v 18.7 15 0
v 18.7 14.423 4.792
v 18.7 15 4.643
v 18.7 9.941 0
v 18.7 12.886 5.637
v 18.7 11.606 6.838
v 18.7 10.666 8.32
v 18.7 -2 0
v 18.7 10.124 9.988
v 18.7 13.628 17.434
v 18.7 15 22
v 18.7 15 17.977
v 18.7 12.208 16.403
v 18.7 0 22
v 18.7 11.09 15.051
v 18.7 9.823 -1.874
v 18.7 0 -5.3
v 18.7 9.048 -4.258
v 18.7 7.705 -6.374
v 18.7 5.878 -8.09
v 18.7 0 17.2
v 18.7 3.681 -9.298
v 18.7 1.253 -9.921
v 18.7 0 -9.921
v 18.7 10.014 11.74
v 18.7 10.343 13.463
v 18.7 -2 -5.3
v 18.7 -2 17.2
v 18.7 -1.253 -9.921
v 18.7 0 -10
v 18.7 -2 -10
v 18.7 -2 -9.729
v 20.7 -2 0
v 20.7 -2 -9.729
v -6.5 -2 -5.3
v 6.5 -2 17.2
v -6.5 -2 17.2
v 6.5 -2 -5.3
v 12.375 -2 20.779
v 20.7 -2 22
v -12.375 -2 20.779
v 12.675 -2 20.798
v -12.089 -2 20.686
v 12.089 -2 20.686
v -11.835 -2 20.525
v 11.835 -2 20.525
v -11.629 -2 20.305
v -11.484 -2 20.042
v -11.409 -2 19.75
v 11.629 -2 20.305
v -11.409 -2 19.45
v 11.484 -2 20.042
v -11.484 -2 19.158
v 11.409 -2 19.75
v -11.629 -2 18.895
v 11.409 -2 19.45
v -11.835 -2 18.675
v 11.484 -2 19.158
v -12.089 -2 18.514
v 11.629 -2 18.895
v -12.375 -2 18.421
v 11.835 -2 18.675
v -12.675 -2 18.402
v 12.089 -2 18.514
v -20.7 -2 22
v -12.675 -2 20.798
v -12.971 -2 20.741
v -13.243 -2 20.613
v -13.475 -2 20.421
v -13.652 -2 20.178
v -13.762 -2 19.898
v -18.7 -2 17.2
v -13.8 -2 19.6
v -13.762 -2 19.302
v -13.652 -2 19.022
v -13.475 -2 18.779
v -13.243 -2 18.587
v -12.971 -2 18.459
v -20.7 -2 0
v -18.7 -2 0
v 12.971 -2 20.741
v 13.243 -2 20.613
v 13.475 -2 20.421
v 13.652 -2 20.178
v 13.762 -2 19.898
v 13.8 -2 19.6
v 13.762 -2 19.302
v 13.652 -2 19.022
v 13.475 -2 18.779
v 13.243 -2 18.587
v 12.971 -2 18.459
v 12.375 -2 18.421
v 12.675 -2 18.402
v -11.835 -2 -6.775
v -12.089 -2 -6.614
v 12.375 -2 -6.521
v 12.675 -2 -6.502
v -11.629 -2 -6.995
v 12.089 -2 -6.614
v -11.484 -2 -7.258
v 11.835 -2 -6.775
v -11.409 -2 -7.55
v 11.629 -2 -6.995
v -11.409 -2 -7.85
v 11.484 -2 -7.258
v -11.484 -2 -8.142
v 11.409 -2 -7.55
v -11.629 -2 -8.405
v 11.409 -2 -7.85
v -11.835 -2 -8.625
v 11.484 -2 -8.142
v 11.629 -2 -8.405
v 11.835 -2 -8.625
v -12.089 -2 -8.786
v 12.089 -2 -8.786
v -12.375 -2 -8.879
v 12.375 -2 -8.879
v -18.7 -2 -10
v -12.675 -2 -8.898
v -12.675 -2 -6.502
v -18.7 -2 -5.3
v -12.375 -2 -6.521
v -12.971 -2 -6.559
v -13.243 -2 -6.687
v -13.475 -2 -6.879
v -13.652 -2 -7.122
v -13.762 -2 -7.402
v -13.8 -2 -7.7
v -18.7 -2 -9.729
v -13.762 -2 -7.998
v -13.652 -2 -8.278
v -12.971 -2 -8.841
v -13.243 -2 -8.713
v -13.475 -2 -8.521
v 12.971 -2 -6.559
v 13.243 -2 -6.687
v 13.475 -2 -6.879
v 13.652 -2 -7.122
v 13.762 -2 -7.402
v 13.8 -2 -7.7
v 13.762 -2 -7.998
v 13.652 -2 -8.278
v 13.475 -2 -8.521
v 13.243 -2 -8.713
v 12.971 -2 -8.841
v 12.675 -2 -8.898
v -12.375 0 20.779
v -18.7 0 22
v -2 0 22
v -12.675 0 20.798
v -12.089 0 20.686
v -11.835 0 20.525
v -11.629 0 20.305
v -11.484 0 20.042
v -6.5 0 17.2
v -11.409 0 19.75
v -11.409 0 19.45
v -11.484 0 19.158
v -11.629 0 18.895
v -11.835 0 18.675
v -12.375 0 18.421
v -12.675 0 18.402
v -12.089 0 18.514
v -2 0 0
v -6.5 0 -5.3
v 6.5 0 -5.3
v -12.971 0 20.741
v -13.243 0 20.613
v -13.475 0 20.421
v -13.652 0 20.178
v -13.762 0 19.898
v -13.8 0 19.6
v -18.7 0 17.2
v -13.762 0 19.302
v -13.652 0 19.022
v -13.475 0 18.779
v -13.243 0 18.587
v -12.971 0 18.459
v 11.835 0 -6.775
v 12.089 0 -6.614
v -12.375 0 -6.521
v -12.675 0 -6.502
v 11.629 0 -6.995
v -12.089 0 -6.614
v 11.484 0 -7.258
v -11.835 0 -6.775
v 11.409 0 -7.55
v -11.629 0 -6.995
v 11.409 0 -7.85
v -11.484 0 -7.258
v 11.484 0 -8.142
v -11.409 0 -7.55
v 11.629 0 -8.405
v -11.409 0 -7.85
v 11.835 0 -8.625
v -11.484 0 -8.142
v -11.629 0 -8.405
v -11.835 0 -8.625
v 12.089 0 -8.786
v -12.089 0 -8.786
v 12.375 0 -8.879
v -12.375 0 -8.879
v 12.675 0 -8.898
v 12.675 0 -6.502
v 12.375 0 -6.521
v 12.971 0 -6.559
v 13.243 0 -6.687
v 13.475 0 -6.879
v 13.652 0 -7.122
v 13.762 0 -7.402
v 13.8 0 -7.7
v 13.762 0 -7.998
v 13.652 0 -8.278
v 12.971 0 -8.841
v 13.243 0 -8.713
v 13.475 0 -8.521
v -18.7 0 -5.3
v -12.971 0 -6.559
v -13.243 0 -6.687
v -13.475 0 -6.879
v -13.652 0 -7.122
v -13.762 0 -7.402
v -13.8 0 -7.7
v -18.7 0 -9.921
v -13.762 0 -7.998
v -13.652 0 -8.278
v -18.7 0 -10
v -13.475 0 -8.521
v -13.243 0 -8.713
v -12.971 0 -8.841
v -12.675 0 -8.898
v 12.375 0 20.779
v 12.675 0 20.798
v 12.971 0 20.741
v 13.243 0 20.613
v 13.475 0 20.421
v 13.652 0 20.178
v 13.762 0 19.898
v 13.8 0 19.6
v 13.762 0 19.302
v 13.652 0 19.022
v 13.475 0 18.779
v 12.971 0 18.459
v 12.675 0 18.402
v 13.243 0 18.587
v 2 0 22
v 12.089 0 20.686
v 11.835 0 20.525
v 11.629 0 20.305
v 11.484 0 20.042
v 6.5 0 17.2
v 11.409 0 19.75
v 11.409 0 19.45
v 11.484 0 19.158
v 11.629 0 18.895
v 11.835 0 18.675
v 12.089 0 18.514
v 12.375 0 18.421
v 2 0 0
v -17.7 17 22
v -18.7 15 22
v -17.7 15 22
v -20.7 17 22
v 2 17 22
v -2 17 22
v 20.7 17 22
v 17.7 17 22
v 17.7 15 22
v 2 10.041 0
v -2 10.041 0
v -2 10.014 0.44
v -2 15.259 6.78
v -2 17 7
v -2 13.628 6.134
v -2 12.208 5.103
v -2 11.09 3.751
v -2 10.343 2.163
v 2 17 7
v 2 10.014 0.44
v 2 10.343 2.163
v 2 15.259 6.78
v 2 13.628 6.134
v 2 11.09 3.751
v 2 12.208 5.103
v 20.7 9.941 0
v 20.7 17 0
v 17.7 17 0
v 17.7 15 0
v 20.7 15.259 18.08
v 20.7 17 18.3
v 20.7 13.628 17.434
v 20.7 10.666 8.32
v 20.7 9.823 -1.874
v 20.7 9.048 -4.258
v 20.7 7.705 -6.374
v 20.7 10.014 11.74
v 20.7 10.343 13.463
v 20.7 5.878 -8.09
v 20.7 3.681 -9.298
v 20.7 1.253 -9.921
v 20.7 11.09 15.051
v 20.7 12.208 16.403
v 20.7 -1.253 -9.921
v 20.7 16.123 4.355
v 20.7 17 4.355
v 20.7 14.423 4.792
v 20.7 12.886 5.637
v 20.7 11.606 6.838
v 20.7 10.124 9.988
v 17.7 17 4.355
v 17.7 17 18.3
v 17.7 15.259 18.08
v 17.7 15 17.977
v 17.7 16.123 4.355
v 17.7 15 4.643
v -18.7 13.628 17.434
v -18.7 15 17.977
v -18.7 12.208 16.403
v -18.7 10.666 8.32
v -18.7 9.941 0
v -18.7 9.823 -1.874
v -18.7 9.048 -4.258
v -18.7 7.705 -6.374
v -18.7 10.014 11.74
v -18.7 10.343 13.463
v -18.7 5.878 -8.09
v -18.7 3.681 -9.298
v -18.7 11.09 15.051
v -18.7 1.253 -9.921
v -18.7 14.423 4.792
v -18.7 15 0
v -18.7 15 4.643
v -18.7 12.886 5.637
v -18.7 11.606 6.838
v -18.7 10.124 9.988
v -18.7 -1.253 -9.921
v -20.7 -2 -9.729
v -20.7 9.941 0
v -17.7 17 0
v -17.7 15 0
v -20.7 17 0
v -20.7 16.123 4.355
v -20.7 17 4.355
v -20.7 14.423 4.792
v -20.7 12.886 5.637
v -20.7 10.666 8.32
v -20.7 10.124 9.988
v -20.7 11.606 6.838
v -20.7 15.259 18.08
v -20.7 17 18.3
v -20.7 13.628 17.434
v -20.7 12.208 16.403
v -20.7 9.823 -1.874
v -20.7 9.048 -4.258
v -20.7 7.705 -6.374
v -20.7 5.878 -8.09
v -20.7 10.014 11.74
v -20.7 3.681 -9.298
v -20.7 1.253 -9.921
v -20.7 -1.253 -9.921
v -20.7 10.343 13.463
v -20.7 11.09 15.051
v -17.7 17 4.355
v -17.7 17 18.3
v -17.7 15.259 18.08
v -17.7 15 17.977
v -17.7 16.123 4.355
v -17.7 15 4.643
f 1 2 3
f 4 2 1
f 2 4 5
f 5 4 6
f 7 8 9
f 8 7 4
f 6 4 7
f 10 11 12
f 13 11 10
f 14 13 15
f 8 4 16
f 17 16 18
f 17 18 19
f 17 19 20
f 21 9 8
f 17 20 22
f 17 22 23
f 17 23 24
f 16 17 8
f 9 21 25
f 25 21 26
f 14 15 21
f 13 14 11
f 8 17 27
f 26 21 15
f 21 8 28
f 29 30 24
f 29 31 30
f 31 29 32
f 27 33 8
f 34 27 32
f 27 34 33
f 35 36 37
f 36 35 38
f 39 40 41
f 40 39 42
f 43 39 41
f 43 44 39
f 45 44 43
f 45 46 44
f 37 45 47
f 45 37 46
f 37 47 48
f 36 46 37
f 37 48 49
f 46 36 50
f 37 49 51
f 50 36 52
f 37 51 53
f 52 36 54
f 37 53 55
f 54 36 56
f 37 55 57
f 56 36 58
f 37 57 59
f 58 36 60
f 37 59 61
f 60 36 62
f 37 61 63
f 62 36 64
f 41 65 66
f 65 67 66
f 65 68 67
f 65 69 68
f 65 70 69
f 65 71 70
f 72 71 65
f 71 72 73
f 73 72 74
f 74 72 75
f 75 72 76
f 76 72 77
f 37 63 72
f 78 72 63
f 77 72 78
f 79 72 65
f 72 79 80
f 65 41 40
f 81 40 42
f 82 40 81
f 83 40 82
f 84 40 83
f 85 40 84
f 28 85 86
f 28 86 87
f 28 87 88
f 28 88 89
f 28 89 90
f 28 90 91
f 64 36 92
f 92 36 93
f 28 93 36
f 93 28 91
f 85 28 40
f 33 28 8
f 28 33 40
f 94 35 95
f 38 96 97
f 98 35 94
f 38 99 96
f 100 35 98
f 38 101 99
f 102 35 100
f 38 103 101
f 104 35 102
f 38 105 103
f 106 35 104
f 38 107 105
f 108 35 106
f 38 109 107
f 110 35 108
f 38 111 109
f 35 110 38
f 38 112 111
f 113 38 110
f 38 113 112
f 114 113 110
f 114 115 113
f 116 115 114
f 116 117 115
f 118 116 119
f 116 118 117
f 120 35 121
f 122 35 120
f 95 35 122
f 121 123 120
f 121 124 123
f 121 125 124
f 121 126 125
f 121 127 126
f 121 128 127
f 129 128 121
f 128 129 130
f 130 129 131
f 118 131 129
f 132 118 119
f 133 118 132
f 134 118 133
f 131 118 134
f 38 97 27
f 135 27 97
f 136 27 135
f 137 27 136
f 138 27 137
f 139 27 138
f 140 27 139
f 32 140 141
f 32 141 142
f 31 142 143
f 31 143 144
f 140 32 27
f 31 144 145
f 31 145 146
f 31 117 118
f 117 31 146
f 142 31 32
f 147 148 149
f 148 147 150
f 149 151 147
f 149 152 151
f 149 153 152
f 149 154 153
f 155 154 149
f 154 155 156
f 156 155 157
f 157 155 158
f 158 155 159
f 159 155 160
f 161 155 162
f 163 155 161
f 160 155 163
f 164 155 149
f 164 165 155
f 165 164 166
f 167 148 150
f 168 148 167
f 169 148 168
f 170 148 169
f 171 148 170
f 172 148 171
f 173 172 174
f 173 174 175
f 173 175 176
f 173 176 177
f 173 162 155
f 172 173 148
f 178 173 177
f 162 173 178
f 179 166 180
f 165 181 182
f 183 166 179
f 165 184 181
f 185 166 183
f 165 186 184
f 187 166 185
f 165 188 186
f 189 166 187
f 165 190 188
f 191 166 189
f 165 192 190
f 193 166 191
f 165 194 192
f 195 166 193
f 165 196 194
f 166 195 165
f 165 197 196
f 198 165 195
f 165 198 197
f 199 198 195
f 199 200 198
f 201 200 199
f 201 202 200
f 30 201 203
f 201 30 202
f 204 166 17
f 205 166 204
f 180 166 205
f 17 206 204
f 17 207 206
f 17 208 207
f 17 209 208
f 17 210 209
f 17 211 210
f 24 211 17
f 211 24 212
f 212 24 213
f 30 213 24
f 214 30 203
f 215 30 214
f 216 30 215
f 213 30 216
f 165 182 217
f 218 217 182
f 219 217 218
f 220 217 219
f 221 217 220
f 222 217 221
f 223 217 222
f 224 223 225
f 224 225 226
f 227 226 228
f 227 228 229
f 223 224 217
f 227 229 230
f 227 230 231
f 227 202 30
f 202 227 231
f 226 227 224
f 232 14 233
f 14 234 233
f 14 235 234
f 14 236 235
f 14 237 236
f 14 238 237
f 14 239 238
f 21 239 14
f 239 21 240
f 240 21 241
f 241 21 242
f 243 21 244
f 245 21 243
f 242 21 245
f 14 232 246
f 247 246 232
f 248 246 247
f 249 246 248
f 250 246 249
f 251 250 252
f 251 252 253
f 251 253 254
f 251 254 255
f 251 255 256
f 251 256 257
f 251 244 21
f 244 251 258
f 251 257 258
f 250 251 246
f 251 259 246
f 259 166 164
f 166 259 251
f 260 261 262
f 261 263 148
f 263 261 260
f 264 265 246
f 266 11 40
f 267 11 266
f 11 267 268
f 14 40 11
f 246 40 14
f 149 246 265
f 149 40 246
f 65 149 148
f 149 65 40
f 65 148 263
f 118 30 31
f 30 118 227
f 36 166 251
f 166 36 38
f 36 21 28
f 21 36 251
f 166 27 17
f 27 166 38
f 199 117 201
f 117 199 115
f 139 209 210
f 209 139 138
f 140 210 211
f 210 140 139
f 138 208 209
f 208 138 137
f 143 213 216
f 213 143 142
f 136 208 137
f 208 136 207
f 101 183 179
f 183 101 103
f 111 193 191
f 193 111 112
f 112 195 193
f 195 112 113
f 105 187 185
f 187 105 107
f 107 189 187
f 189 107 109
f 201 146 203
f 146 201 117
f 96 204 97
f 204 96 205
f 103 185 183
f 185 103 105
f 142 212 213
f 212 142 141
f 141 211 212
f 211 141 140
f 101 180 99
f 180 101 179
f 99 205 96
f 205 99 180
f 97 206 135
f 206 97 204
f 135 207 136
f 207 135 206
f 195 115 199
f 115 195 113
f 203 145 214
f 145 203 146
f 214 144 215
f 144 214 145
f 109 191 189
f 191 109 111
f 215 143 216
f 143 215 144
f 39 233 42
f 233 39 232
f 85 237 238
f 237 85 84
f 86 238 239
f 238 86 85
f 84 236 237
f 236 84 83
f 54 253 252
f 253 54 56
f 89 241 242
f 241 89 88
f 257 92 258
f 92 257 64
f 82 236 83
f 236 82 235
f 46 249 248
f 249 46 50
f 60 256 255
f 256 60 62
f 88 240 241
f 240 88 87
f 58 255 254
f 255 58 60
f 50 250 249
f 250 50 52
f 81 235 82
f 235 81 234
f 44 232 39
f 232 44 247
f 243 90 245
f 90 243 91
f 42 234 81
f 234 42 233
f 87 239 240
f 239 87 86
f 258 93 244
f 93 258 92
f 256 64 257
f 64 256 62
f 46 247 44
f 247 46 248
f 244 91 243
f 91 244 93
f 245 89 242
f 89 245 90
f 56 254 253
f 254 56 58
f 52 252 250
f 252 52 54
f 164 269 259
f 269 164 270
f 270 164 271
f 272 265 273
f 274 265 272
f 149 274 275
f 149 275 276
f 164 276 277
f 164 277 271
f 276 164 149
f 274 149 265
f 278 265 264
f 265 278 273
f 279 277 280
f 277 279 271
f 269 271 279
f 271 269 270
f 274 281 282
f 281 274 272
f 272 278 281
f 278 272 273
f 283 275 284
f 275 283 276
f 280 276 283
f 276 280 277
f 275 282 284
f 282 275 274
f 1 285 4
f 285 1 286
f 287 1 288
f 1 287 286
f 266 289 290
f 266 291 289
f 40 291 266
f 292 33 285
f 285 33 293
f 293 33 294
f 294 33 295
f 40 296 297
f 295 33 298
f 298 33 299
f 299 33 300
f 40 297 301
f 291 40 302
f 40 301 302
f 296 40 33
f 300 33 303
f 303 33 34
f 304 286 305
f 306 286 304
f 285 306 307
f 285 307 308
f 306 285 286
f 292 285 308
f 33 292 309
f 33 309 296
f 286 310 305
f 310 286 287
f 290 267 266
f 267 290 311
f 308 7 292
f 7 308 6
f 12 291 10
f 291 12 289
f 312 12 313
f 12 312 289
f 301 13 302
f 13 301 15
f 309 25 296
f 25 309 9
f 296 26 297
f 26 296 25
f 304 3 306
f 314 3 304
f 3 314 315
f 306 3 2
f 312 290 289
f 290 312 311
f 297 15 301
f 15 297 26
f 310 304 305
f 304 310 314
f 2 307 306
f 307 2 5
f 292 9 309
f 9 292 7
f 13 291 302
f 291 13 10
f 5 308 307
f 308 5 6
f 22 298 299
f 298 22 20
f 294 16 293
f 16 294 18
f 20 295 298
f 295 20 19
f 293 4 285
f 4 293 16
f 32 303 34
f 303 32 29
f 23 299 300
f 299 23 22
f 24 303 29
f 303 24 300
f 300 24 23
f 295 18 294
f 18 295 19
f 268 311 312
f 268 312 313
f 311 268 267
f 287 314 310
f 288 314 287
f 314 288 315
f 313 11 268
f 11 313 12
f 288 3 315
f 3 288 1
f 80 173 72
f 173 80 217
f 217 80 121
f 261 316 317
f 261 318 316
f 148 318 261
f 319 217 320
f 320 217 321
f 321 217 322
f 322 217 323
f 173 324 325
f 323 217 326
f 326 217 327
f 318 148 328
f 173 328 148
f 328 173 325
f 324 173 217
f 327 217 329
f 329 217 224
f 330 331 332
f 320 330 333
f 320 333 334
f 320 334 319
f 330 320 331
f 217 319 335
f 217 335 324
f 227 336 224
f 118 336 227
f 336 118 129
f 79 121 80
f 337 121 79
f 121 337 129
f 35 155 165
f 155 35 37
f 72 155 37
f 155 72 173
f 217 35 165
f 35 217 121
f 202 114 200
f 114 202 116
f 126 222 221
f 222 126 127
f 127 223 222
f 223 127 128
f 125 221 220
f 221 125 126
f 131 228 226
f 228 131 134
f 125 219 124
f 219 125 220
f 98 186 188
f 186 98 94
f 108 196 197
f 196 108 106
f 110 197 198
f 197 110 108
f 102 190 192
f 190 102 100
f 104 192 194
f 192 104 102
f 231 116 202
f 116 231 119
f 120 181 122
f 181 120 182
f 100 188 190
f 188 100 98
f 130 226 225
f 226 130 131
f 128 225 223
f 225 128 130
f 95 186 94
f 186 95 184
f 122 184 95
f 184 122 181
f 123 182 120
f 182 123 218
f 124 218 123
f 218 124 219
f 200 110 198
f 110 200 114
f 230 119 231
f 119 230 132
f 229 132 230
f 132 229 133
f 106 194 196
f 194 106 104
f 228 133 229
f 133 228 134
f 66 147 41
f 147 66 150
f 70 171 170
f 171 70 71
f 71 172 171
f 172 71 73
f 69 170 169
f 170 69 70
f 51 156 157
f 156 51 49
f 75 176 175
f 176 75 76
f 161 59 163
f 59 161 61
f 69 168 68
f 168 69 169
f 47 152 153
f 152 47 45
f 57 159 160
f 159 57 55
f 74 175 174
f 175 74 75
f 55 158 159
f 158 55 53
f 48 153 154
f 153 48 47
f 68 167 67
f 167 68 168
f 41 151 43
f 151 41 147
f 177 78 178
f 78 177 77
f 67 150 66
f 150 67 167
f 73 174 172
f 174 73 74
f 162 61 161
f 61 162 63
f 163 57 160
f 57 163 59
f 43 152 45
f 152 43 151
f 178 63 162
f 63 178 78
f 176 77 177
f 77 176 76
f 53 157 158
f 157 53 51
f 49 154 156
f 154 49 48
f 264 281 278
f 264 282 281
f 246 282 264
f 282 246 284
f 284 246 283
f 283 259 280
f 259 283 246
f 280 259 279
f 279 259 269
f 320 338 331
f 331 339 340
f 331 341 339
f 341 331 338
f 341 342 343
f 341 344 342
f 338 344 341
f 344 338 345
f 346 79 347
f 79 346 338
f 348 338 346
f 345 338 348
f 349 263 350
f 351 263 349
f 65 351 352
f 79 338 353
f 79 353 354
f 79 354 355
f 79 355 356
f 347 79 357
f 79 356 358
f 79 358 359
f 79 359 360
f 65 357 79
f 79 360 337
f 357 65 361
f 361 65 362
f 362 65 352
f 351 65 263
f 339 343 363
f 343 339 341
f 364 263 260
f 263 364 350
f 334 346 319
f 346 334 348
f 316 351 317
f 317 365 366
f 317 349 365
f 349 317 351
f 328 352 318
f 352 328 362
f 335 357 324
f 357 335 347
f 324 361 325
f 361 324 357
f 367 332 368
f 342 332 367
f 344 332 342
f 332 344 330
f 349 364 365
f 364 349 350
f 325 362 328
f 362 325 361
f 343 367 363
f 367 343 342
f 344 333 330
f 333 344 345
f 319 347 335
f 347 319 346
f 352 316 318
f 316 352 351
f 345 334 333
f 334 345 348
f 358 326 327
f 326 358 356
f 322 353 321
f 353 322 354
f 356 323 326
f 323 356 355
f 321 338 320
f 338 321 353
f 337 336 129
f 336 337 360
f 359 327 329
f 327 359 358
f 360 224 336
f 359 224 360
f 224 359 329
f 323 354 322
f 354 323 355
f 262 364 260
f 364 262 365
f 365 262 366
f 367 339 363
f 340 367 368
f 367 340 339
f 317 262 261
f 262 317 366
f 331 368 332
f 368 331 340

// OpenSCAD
// --- Printer setings ---
$fn = 25;
$fs = .4;
$fa = 1;

// --- Holder sides ---
module back_side(a=2) {
    translate([0,0,-10])
    rotate([90,0,0])
    difference() {
        color("black")
        cube([18.7,32,a]);
        translate([6.5,4.7,-.1])
            cube([12.3,22.5,a+1]);
        
        translate([6.5+6.1,2.3,-.1])
            cylinder(h=a+1,r=1.2);
        
        translate([6.5+6.1,27.3+2.3,-.1])
            cylinder(h=a+1,r=1.2);
    }
}

module left_side(a=2) {
    difference() {
        translate([0,-a,0])
            rotate([0,-90,0])
                color("green")
                cube([22,17+a,a]);

        translate([.1,17,0])
        rotate([0,-90,0])
            cylinder(h=a+2,r=7);
    }
}

module rigth_side(a=2) {
    union(){
        difference() {
            translate([18.7+a,-a,0])
                rotate([0,-90,0])
                    cube([22,17+a,a]);
                
            translate([18.7+a+.2,17,22-4.7-6])
                rotate([0,-90,0])    
                    cylinder(h=a+1,r=7);
        }


        difference() {
            translate([18.7+a,0,0])
                rotate([0,-90,0])    
                    cylinder(h=a,r=10);
                
            translate([18.7+a+.2,-10-a,-10])
                rotate([0,-90,0])
                    cube([20,10,a+2]);
        }
    }
}

module front_side(a=2) {
    difference() {
        translate([18.7-1,17,0])
        rotate([90,0,0])
            color("violet")
            cube([1,22,a]);
        
        translate([18.7+1,17,22-4.7-6])
            rotate([0,-90,0])    
                cylinder(h=a+1,r=7);
   }
}


// --- Servo holders ---
module servoHolderA(mm=2) {
    union() {
        back_side(mm);
        left_side(mm);
        rigth_side(mm);
        front_side(mm);
    }
}

module servoHolderB(mm=2) {
    mirror([1,0,0])
        servoHolderA(mm);
}

// --------------------------------------------

servoHolderA(mm=2);
servoHolderB(mm=2);
